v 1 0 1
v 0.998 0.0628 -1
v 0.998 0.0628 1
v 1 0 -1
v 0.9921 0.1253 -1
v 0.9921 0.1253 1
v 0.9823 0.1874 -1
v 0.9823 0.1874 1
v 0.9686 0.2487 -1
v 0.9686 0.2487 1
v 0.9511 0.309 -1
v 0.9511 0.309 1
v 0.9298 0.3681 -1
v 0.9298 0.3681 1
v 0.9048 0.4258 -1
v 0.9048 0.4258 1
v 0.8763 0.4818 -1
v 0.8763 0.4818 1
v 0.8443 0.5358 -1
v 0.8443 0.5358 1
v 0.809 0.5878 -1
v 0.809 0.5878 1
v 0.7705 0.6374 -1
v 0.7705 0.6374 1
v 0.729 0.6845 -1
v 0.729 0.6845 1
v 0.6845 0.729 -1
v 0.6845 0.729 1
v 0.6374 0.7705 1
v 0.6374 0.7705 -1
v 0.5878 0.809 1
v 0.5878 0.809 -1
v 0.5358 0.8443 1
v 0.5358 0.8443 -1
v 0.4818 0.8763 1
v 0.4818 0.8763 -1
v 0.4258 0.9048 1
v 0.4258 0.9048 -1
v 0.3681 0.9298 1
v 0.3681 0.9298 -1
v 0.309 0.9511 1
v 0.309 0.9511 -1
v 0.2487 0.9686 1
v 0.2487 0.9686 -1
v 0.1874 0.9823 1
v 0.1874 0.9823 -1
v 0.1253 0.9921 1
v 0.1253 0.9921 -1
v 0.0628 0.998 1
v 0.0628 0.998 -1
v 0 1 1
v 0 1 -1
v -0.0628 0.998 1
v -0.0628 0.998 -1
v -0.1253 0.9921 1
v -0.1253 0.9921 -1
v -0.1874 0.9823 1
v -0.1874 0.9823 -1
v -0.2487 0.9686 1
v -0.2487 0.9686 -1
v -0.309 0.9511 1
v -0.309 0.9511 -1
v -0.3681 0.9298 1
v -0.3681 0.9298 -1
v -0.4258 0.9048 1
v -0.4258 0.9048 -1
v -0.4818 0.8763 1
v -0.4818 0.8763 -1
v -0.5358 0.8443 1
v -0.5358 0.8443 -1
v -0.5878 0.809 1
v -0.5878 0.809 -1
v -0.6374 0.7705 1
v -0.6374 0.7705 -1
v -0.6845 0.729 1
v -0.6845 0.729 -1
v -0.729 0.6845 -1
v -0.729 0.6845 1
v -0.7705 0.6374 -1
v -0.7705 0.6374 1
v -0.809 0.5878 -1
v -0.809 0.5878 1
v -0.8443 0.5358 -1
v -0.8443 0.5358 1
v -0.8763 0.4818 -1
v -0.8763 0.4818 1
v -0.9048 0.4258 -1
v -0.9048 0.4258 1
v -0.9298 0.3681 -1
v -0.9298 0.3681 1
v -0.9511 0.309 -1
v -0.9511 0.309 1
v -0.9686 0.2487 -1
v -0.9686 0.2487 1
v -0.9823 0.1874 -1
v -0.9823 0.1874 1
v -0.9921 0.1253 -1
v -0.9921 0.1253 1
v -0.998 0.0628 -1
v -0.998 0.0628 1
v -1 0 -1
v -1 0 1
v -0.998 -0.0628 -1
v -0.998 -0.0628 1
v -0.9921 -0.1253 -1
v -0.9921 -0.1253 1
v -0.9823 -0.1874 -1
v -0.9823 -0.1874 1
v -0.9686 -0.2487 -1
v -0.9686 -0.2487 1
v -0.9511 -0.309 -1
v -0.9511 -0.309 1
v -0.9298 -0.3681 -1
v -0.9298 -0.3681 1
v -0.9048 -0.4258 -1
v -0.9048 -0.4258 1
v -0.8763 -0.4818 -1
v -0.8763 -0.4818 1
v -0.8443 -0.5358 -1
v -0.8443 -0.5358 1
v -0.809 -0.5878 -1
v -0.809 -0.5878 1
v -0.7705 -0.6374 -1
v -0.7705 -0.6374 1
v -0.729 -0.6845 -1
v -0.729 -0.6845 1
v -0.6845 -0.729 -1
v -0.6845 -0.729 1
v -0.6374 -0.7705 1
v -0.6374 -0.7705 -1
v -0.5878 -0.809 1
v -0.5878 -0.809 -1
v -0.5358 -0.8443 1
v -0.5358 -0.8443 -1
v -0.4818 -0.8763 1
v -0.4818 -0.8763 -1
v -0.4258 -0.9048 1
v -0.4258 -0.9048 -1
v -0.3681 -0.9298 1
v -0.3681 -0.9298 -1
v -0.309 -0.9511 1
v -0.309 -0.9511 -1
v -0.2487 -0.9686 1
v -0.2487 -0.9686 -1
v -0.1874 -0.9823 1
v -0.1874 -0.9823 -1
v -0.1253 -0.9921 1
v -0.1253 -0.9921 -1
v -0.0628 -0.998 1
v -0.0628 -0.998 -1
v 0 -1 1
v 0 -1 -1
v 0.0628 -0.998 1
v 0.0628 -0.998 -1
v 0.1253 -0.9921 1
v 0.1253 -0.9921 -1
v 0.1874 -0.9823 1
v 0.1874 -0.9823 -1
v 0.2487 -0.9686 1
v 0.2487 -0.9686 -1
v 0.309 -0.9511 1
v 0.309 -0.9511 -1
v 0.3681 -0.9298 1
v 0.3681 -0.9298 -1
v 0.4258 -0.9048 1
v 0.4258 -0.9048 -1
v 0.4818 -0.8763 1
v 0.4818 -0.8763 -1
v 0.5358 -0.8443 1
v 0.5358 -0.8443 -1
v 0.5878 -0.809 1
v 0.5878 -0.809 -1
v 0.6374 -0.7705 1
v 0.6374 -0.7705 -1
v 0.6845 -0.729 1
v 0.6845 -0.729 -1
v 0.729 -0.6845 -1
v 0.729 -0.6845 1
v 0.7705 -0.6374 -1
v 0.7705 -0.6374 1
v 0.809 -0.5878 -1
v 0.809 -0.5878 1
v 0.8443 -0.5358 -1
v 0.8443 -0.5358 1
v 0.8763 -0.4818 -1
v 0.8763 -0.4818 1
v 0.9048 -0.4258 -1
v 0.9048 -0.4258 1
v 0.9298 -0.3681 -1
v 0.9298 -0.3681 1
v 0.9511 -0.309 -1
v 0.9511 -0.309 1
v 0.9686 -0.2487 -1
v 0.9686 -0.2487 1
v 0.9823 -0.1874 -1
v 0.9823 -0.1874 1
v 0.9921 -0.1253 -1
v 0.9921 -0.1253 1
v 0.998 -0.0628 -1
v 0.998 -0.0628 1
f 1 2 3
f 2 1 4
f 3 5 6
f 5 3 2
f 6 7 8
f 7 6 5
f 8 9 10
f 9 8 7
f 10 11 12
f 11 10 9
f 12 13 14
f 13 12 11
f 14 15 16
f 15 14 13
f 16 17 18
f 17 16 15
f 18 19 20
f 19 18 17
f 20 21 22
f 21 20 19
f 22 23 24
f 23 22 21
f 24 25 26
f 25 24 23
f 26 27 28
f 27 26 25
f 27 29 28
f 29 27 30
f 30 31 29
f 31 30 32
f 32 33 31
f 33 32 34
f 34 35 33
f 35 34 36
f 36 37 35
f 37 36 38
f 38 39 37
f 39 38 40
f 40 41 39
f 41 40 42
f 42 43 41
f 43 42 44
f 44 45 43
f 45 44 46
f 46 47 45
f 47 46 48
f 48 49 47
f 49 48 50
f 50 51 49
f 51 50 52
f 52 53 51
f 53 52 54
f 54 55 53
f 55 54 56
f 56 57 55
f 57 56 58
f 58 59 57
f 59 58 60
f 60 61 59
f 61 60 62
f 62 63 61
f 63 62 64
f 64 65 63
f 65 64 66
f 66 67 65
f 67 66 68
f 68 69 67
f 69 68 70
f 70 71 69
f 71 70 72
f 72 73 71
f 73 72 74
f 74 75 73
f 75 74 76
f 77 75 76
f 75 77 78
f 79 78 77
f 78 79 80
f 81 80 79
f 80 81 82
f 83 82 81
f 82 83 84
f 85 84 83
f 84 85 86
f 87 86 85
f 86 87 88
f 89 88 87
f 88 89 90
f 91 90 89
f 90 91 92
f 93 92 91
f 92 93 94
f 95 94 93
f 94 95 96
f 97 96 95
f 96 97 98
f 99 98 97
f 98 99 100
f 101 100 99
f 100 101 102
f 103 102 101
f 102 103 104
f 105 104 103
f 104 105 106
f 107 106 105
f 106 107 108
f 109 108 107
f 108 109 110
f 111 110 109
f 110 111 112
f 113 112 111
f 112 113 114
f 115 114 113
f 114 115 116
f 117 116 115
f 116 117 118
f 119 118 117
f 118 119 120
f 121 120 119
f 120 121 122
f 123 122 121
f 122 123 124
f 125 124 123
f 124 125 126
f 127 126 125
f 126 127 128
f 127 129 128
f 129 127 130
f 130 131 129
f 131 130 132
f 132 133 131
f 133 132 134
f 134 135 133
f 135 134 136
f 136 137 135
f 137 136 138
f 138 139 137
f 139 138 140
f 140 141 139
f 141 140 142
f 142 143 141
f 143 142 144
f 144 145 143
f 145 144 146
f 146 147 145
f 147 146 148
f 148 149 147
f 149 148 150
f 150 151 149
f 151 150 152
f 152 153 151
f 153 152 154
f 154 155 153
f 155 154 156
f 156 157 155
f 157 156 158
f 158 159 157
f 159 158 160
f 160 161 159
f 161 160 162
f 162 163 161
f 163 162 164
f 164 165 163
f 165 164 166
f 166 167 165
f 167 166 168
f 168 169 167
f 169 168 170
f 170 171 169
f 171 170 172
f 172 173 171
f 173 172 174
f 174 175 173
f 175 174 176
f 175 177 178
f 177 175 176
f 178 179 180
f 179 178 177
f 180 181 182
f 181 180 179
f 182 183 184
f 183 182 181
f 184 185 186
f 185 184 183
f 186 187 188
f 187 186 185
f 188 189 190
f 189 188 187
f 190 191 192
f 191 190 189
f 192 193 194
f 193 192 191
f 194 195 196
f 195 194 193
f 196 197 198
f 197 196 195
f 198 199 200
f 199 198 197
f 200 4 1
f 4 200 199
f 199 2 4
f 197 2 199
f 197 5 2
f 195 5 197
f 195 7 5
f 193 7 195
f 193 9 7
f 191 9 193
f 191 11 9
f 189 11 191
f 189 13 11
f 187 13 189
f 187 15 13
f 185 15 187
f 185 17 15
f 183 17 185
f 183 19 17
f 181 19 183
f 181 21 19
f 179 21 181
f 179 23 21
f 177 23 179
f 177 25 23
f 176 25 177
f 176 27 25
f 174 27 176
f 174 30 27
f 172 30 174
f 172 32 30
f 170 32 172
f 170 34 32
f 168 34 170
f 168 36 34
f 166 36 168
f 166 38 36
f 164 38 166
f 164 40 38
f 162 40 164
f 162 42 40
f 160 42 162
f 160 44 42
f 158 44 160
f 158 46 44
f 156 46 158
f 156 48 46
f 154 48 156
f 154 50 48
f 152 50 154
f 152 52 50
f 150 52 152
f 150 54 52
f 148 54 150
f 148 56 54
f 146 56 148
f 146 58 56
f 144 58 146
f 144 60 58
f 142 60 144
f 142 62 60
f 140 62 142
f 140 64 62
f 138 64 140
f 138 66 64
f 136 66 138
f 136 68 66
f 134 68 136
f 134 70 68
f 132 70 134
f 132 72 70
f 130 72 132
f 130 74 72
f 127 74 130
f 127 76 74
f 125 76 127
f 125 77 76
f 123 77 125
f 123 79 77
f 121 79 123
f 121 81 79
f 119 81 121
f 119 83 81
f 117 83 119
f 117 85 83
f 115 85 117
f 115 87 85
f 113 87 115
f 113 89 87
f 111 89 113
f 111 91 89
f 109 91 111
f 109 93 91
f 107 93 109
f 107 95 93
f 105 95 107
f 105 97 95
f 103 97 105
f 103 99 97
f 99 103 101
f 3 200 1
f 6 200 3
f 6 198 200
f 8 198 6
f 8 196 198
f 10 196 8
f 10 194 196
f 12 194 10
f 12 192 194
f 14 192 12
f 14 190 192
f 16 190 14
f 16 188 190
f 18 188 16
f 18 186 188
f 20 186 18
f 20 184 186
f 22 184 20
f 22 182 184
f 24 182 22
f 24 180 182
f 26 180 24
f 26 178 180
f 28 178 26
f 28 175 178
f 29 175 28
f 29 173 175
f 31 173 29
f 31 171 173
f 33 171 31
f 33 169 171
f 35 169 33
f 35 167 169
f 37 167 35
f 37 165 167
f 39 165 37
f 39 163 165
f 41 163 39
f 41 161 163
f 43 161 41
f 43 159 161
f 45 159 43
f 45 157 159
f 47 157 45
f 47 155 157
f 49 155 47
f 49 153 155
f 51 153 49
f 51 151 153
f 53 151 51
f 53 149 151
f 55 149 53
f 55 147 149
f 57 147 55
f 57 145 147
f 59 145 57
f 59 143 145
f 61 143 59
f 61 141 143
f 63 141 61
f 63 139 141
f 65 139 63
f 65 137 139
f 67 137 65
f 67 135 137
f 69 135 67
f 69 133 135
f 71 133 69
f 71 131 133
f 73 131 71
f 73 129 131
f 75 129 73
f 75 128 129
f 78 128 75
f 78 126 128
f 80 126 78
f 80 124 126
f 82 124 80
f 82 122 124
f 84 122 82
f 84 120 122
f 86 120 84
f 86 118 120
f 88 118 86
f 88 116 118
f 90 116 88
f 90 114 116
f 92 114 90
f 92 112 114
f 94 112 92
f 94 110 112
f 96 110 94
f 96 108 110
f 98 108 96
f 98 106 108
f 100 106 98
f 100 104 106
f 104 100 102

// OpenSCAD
$fn = 100;

cylinder($fa = 100, $fs = 100, h = 2, r1 = 1, r2 = 1, center = true);
